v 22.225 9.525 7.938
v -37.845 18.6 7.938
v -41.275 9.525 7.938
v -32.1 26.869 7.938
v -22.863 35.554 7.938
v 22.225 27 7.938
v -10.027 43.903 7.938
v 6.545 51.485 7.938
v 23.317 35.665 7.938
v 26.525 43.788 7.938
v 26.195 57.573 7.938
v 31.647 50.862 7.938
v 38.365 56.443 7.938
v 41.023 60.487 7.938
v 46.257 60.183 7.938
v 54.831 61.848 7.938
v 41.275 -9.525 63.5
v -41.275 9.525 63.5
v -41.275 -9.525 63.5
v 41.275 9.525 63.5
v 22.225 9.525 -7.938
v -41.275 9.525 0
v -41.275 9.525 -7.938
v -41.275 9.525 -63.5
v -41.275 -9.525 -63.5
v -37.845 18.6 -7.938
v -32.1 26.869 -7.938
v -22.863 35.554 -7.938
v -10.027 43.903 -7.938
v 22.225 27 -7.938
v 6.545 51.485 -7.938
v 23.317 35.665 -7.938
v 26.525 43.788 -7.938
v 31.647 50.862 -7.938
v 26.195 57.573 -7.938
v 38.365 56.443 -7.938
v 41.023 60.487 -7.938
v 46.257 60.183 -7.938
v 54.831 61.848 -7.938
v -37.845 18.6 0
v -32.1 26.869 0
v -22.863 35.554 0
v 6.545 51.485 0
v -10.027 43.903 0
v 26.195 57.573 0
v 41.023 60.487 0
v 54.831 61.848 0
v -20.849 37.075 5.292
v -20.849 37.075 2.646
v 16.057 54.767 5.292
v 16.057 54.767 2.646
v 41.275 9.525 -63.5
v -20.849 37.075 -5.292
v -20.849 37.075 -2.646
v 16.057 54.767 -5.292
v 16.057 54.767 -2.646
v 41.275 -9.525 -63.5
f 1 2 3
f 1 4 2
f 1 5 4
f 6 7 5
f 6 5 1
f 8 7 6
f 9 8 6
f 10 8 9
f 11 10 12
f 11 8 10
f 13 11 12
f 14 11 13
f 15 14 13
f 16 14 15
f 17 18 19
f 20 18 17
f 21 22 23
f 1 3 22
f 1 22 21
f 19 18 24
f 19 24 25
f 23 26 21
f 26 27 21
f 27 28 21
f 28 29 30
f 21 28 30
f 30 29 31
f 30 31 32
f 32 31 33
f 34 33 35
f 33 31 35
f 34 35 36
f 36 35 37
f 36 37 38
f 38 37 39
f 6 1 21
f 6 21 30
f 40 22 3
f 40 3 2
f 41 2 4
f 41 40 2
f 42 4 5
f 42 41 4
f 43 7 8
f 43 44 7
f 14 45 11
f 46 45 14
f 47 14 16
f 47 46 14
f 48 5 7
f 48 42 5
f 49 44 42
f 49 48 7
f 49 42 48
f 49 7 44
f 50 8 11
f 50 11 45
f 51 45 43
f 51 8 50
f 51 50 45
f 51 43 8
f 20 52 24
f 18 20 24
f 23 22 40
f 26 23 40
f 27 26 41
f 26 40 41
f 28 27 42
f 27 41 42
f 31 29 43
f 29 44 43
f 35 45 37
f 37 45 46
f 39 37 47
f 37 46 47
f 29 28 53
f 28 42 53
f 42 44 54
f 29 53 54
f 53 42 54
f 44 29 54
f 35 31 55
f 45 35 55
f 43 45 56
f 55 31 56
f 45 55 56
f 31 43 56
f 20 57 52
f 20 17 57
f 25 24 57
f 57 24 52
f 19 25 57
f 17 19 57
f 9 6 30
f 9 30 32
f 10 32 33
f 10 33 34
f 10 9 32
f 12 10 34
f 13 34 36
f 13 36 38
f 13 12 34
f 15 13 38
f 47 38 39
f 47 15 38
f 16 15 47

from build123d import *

# Parameters (mm, degrees)
F1_DEPTH = 63.5
F0_W     = 25.4
F0_H     = 28.575
F2_DEPTH = 25.4
F3_DEPTH = 7.9375


# Not quite as in the source:
# - a feature of the source that left no trace in its solid (it failed there, or was rolled back) is left out


with BuildPart() as f1:
    # F0 (on Top) → F1 (new body, symmetric)
    with BuildSketch(Plane.XY):
        Polygon((41.275, -9.525), (41.275, 9.525), (22.225, 9.525), (-41.275, 9.525), (-41.275, -9.525), align=None)
    extrude(amount=F1_DEPTH, both=True)

    # F0 (on Top) → F2 (cut, symmetric)
    with BuildSketch(Plane.XY):
        with BuildLine():
            Line((22.225, 9.525), (41.275, 9.525))
            Line((41.275, 9.525), (41.275, 27.0002))
            ThreePointArc((41.275, 27.0002), (45.9246798487, 38.2255201513), (57.15, 42.8752))
            Line((57.15, 42.8752), (60.325, 42.8752))
            Line((60.325, 42.8752), (60.325, 61.9252))
            Line((60.325, 61.9252), (57.15, 61.9252))
            add(Edge.make_bspline(
                [(54.8307298061, 61.8481068348), (55.6137268289, 61.8824254321), (56.3870657784, 61.908135928), (57.15, 61.9252)],
                knots=[109.0533920202, 109.0533920202, 109.0533920202, 109.0533920202, 111.5045361635, 111.5045361635, 111.5045361635, 111.5045361635], degree=3))
            ThreePointArc((54.8307298061, 61.8481068348), (31.6474889813, 50.8618335723), (22.225, 27.0002))
            Line((22.225, 27.0002), (22.225, 9.525))
        make_face()
        with Locations((98.425, 52.3875)):
            Rectangle(F0_W, F0_H)
        Polygon((60.325, 61.9252), (60.325, 42.8752), (60.325, 38.1), (85.725, 38.1), (85.725, 66.675), (60.325, 66.675), align=None)
    extrude(amount=F2_DEPTH, both=True, mode=Mode.SUBTRACT)


with BuildPart() as f3:
    # F0 (on Top) → F3 (new body, symmetric)
    with BuildSketch(Plane.XY):
        with BuildLine():
            Line((-41.275, 9.525), (22.225, 9.525))
            Line((22.225, 9.525), (22.225, 27.0002))
            ThreePointArc((22.225, 27.0002), (31.6474889813, 50.8618335723), (54.8307298061, 61.8481068348))
            add(Edge.make_bspline(
                [(-41.275, 9.525), (-33.959118263, 41.7552285314), (19.9945568679, 60.3212445943), (54.8307298061, 61.8481068348)],
                knots=[0, 0, 0, 0, 109.0533920202, 109.0533920202, 109.0533920202, 109.0533920202], degree=3))
        make_face()
    extrude(amount=F3_DEPTH, both=True)


solid = Compound([f1.part, f3.part])
